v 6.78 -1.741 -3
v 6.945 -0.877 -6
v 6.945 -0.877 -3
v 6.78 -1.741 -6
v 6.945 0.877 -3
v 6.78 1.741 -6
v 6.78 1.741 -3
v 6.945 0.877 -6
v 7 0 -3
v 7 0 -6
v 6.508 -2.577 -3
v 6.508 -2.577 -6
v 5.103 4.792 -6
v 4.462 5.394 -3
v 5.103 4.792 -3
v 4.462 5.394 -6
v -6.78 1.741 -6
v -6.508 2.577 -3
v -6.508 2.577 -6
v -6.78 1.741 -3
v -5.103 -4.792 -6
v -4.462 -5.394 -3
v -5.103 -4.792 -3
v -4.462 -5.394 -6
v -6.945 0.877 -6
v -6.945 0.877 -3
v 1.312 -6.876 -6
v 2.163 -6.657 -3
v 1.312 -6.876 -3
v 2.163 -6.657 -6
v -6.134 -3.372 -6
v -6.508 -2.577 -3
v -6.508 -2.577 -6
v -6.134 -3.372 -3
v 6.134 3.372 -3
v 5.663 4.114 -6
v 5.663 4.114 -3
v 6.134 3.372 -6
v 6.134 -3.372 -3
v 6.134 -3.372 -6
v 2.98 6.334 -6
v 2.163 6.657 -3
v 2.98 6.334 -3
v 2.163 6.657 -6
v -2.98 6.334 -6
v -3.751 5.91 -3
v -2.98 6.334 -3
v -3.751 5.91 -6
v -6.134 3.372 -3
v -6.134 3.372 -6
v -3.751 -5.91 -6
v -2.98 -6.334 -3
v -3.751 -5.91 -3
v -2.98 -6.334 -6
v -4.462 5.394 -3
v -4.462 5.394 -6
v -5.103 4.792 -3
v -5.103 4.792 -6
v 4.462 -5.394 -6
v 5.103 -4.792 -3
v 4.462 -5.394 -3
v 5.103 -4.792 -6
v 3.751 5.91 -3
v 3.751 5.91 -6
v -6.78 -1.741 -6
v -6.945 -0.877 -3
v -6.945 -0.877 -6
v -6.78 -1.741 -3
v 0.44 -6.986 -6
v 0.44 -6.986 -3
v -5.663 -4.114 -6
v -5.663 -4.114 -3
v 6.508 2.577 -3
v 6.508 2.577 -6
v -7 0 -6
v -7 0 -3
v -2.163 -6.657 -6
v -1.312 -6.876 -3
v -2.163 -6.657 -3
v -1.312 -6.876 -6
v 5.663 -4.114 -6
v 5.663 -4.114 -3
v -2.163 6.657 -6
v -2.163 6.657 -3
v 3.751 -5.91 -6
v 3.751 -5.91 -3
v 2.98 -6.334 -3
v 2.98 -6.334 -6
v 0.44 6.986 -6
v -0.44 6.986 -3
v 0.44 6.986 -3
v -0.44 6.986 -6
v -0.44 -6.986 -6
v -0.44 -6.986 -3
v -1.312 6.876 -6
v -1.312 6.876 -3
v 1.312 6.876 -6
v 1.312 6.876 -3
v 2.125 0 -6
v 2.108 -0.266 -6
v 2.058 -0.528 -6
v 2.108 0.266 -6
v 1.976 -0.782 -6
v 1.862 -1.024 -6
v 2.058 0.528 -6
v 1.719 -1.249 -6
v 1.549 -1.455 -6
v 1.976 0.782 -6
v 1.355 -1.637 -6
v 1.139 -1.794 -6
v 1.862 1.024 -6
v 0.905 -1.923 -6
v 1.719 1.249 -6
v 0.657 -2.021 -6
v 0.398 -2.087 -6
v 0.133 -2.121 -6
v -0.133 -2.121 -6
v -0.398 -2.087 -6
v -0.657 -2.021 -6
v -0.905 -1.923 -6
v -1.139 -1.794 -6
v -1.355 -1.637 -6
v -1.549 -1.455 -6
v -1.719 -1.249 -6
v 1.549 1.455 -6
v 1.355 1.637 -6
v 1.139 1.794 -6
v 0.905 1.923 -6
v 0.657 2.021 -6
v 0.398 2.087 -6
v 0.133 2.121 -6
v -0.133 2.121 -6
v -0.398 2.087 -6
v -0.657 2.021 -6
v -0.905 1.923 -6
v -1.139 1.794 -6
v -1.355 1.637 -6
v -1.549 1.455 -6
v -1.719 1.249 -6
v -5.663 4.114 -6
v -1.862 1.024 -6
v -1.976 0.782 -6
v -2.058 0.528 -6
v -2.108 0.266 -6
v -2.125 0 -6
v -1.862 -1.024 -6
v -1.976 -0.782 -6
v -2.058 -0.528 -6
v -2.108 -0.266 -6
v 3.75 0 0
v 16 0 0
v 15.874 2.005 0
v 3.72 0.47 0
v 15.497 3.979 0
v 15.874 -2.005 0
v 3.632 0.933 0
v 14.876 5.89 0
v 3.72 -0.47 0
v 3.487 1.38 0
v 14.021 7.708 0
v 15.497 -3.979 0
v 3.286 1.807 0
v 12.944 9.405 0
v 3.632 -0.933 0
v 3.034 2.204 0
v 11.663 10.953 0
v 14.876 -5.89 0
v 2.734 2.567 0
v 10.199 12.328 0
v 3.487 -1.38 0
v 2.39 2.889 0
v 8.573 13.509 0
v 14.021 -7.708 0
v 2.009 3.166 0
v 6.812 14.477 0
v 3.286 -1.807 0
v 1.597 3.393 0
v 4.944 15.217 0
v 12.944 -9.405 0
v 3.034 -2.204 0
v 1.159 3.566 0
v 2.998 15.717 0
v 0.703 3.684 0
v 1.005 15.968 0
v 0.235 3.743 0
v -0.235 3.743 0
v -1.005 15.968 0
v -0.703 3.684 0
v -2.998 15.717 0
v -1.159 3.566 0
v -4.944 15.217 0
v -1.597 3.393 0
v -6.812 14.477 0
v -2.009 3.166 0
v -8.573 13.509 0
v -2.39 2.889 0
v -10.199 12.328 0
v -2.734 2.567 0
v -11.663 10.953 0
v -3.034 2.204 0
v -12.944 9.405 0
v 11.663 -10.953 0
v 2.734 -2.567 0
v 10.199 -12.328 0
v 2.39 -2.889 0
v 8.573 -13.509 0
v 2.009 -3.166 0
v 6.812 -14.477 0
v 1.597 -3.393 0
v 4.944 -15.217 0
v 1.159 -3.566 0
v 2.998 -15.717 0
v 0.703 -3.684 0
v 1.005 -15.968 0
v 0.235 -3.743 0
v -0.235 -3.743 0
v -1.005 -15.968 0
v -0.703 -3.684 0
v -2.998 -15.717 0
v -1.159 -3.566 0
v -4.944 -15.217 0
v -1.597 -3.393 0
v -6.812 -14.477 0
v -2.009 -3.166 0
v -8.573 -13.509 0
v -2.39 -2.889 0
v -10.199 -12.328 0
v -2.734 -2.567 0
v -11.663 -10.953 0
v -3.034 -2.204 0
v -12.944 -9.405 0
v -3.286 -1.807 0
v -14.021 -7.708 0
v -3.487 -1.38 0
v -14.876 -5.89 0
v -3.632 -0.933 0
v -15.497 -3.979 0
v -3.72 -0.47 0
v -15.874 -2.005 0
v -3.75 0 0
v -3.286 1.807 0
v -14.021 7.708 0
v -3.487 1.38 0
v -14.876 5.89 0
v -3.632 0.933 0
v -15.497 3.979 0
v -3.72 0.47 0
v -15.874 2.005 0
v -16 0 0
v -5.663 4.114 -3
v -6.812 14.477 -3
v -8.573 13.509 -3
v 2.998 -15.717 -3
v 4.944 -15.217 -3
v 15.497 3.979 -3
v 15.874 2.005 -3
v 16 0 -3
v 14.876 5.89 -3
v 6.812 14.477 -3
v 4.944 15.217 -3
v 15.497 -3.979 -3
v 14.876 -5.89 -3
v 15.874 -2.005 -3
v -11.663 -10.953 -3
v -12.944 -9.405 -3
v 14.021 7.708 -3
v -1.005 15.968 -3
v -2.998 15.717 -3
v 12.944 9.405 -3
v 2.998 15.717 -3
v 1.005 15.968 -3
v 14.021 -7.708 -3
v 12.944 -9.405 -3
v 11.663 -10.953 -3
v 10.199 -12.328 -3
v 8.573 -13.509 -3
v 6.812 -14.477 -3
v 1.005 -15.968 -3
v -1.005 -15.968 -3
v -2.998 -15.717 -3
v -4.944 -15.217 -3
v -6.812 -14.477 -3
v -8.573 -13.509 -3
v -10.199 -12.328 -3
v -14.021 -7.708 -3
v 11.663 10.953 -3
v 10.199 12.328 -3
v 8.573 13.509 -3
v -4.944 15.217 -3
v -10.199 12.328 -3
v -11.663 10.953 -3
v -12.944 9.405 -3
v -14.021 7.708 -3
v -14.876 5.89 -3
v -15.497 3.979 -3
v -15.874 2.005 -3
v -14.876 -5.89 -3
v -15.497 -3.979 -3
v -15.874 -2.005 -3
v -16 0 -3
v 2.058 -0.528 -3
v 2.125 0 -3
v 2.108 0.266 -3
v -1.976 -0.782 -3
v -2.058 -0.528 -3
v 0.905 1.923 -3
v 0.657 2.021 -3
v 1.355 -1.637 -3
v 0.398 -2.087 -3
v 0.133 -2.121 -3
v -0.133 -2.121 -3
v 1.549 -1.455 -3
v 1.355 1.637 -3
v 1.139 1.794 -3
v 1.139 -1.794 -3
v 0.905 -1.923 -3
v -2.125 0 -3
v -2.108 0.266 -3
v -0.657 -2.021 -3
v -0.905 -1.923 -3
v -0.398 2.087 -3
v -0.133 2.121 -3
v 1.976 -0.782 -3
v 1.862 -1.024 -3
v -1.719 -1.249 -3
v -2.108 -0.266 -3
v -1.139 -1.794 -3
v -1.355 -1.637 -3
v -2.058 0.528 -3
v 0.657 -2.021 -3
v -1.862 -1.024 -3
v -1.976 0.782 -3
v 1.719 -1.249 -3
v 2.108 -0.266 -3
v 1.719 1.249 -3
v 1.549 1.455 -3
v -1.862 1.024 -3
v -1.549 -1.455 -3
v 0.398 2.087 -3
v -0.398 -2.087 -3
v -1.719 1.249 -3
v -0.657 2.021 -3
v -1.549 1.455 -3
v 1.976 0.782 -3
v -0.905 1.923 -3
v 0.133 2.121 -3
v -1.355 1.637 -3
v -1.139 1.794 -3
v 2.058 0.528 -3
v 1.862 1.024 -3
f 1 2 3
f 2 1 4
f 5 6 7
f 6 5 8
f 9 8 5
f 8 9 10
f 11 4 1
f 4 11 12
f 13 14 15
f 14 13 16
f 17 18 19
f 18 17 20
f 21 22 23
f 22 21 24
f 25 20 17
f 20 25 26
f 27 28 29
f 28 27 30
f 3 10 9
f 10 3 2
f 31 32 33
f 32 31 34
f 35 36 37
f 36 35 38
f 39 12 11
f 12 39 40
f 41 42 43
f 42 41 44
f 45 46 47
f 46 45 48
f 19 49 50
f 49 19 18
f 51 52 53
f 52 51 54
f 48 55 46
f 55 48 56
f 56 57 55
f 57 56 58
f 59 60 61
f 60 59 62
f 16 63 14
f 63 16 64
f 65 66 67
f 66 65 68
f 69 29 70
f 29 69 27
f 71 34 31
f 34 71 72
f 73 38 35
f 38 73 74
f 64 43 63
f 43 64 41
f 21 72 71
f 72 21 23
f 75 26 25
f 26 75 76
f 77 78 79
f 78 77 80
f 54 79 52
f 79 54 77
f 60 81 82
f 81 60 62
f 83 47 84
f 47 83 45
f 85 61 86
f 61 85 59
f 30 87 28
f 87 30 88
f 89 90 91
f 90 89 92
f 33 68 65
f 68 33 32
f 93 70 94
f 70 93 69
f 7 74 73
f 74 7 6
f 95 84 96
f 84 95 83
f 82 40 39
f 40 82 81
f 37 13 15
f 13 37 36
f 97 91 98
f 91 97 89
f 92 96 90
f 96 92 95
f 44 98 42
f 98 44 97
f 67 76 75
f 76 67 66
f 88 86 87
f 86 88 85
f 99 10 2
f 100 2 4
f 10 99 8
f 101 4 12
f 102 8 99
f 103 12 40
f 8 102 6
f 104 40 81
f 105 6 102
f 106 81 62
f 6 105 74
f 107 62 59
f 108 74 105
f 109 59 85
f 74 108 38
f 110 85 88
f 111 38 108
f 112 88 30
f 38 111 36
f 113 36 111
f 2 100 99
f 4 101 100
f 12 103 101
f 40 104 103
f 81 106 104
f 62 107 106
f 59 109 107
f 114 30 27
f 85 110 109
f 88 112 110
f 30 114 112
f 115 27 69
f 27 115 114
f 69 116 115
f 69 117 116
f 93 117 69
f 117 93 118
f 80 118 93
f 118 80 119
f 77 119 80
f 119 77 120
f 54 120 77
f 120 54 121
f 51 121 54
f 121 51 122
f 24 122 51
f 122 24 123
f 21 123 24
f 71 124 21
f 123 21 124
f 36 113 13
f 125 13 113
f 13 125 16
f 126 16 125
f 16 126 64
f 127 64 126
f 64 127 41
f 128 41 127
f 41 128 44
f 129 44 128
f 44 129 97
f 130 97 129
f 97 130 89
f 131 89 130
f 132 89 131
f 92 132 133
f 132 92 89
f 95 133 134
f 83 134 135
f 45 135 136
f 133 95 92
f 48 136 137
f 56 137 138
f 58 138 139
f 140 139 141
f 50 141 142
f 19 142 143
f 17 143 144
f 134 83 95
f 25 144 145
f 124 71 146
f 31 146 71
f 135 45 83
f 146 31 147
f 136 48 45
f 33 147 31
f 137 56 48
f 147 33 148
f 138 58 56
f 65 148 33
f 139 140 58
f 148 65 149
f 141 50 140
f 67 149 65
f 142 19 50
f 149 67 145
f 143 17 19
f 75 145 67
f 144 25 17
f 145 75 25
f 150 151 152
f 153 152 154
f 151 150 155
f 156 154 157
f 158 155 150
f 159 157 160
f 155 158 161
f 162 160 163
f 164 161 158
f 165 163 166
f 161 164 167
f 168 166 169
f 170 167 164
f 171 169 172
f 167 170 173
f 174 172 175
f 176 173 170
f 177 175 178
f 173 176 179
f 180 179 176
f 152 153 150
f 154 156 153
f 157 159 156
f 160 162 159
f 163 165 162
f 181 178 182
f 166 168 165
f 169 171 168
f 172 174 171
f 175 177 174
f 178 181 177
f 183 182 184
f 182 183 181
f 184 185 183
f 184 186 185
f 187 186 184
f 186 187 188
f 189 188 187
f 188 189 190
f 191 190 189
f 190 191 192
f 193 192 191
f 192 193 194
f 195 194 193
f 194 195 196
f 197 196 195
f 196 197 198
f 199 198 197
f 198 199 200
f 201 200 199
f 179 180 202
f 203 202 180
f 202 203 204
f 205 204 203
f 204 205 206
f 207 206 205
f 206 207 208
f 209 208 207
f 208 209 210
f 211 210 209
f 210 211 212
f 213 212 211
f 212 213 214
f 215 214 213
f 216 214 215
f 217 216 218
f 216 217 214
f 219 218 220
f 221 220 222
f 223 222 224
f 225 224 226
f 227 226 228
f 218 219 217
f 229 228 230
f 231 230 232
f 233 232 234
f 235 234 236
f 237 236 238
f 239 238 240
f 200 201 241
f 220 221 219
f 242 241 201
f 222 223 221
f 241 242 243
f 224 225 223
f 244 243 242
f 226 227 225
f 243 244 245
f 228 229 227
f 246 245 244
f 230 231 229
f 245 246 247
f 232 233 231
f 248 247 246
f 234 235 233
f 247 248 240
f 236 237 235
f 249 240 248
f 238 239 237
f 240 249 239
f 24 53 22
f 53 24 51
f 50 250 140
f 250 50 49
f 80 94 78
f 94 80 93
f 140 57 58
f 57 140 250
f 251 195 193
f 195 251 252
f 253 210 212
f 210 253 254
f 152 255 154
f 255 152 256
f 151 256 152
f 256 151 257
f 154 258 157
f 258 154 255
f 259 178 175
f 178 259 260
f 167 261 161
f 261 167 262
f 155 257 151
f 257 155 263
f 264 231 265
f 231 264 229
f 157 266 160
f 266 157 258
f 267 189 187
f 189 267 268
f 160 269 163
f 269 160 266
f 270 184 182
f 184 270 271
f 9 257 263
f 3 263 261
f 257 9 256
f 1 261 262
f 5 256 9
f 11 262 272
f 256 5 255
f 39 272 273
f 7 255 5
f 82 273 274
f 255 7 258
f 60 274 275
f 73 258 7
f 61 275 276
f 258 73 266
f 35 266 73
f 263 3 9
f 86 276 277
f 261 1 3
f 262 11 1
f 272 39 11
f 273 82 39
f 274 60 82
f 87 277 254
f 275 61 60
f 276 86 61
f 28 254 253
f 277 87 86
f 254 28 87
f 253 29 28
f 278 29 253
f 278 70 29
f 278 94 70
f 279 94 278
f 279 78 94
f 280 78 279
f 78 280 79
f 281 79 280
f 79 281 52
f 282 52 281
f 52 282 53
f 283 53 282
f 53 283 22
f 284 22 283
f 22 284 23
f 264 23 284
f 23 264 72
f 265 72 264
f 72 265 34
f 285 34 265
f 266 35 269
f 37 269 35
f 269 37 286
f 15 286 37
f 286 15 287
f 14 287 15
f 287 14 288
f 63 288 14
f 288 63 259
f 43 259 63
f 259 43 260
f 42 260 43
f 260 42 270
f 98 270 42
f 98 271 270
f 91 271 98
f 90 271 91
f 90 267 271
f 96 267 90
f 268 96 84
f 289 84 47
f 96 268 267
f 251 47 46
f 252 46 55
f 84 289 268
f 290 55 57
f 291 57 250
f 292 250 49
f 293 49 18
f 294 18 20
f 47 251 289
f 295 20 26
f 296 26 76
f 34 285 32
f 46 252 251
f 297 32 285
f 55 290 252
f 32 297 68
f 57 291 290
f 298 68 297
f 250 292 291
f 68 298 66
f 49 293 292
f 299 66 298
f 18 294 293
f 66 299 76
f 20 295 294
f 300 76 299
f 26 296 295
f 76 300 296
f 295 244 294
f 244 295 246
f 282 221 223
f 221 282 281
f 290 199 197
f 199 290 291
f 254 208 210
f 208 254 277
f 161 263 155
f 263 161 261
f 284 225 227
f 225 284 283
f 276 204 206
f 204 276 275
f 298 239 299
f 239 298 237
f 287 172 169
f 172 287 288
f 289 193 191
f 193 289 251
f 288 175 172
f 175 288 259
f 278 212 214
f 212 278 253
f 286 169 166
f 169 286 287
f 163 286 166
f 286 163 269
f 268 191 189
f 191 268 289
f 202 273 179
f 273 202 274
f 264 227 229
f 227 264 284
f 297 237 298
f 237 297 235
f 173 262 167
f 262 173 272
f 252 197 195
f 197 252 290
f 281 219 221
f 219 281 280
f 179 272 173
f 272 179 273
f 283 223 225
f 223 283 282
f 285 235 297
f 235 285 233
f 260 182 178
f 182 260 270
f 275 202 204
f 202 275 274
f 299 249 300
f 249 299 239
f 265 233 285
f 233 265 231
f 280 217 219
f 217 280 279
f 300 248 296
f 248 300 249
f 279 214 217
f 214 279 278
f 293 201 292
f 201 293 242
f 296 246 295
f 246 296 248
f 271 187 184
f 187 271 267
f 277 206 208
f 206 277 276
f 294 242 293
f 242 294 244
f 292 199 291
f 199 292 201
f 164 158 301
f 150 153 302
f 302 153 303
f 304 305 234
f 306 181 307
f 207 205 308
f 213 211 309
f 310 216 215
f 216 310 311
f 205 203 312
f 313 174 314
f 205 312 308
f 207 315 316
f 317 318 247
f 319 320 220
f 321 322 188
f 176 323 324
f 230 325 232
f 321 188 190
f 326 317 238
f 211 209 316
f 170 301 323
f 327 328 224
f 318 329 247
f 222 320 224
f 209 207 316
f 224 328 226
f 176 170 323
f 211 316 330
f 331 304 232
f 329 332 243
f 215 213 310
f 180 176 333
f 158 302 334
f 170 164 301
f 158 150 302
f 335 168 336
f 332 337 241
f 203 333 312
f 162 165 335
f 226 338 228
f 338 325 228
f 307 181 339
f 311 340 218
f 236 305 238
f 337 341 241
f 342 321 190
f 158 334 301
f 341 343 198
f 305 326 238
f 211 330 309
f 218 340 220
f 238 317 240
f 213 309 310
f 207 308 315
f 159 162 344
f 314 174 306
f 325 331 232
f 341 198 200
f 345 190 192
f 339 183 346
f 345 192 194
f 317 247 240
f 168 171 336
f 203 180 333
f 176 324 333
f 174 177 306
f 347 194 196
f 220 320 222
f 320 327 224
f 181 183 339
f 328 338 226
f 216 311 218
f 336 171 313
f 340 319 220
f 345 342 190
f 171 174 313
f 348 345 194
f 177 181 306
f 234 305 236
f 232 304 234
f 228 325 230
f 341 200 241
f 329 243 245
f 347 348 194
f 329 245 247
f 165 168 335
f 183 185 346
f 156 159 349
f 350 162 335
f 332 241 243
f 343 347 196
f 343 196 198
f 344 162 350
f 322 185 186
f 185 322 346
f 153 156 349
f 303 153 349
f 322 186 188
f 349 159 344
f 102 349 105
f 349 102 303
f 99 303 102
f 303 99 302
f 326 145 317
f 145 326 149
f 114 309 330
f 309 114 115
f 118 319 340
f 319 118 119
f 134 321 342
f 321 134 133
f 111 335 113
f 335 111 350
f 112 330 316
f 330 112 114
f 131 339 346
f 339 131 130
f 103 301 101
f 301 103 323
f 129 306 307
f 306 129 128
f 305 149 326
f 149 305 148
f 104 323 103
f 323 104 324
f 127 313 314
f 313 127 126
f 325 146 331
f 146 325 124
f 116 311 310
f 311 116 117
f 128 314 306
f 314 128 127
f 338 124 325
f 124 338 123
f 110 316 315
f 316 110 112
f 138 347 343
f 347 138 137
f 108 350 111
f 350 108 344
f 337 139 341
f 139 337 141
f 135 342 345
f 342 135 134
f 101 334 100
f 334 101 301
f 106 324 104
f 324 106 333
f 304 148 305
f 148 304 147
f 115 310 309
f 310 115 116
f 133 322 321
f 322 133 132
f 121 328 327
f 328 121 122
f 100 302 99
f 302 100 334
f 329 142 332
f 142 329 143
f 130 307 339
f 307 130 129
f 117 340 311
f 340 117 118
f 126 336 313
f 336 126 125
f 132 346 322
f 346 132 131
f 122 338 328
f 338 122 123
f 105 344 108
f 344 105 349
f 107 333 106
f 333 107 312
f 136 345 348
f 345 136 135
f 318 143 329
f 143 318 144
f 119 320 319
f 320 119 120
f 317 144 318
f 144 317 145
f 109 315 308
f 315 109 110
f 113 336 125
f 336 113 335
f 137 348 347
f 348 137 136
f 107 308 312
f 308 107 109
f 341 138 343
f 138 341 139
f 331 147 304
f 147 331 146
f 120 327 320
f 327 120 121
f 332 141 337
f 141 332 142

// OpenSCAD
$fn = 50;


difference() {
	union() {
		translate(v = [0, 0, -6.0000000000]) {
			cylinder(h = 6, r = 7.0000000000);
		}
		translate(v = [0, 0, -3.0000000000]) {
			cylinder(h = 3, r = 16.0000000000);
		}
	}
	union() {
		translate(v = [0, 0, 0]) {
			rotate(a = [0, 0, 0]) {
				difference() {
					union() {
						#translate(v = [0, 0, -6.0000000000]) {
							cylinder(h = 6, r = 2.0000000000);
						}
						#translate(v = [0, 0, -3]) {
							cylinder(h = 3, r = 7.0000000000, r1 = 2.1250000000, r2 = 3.7500000000);
						}
						#translate(v = [0, 0, -6.0000000000]) {
							cylinder(h = 6, r = 2.1250000000);
						}
						#translate(v = [0, 0, -6.0000000000]) {
							cylinder(h = 6, r = 2.0000000000);
						}
					}
					union();
				}
			}
		}
	}
}
